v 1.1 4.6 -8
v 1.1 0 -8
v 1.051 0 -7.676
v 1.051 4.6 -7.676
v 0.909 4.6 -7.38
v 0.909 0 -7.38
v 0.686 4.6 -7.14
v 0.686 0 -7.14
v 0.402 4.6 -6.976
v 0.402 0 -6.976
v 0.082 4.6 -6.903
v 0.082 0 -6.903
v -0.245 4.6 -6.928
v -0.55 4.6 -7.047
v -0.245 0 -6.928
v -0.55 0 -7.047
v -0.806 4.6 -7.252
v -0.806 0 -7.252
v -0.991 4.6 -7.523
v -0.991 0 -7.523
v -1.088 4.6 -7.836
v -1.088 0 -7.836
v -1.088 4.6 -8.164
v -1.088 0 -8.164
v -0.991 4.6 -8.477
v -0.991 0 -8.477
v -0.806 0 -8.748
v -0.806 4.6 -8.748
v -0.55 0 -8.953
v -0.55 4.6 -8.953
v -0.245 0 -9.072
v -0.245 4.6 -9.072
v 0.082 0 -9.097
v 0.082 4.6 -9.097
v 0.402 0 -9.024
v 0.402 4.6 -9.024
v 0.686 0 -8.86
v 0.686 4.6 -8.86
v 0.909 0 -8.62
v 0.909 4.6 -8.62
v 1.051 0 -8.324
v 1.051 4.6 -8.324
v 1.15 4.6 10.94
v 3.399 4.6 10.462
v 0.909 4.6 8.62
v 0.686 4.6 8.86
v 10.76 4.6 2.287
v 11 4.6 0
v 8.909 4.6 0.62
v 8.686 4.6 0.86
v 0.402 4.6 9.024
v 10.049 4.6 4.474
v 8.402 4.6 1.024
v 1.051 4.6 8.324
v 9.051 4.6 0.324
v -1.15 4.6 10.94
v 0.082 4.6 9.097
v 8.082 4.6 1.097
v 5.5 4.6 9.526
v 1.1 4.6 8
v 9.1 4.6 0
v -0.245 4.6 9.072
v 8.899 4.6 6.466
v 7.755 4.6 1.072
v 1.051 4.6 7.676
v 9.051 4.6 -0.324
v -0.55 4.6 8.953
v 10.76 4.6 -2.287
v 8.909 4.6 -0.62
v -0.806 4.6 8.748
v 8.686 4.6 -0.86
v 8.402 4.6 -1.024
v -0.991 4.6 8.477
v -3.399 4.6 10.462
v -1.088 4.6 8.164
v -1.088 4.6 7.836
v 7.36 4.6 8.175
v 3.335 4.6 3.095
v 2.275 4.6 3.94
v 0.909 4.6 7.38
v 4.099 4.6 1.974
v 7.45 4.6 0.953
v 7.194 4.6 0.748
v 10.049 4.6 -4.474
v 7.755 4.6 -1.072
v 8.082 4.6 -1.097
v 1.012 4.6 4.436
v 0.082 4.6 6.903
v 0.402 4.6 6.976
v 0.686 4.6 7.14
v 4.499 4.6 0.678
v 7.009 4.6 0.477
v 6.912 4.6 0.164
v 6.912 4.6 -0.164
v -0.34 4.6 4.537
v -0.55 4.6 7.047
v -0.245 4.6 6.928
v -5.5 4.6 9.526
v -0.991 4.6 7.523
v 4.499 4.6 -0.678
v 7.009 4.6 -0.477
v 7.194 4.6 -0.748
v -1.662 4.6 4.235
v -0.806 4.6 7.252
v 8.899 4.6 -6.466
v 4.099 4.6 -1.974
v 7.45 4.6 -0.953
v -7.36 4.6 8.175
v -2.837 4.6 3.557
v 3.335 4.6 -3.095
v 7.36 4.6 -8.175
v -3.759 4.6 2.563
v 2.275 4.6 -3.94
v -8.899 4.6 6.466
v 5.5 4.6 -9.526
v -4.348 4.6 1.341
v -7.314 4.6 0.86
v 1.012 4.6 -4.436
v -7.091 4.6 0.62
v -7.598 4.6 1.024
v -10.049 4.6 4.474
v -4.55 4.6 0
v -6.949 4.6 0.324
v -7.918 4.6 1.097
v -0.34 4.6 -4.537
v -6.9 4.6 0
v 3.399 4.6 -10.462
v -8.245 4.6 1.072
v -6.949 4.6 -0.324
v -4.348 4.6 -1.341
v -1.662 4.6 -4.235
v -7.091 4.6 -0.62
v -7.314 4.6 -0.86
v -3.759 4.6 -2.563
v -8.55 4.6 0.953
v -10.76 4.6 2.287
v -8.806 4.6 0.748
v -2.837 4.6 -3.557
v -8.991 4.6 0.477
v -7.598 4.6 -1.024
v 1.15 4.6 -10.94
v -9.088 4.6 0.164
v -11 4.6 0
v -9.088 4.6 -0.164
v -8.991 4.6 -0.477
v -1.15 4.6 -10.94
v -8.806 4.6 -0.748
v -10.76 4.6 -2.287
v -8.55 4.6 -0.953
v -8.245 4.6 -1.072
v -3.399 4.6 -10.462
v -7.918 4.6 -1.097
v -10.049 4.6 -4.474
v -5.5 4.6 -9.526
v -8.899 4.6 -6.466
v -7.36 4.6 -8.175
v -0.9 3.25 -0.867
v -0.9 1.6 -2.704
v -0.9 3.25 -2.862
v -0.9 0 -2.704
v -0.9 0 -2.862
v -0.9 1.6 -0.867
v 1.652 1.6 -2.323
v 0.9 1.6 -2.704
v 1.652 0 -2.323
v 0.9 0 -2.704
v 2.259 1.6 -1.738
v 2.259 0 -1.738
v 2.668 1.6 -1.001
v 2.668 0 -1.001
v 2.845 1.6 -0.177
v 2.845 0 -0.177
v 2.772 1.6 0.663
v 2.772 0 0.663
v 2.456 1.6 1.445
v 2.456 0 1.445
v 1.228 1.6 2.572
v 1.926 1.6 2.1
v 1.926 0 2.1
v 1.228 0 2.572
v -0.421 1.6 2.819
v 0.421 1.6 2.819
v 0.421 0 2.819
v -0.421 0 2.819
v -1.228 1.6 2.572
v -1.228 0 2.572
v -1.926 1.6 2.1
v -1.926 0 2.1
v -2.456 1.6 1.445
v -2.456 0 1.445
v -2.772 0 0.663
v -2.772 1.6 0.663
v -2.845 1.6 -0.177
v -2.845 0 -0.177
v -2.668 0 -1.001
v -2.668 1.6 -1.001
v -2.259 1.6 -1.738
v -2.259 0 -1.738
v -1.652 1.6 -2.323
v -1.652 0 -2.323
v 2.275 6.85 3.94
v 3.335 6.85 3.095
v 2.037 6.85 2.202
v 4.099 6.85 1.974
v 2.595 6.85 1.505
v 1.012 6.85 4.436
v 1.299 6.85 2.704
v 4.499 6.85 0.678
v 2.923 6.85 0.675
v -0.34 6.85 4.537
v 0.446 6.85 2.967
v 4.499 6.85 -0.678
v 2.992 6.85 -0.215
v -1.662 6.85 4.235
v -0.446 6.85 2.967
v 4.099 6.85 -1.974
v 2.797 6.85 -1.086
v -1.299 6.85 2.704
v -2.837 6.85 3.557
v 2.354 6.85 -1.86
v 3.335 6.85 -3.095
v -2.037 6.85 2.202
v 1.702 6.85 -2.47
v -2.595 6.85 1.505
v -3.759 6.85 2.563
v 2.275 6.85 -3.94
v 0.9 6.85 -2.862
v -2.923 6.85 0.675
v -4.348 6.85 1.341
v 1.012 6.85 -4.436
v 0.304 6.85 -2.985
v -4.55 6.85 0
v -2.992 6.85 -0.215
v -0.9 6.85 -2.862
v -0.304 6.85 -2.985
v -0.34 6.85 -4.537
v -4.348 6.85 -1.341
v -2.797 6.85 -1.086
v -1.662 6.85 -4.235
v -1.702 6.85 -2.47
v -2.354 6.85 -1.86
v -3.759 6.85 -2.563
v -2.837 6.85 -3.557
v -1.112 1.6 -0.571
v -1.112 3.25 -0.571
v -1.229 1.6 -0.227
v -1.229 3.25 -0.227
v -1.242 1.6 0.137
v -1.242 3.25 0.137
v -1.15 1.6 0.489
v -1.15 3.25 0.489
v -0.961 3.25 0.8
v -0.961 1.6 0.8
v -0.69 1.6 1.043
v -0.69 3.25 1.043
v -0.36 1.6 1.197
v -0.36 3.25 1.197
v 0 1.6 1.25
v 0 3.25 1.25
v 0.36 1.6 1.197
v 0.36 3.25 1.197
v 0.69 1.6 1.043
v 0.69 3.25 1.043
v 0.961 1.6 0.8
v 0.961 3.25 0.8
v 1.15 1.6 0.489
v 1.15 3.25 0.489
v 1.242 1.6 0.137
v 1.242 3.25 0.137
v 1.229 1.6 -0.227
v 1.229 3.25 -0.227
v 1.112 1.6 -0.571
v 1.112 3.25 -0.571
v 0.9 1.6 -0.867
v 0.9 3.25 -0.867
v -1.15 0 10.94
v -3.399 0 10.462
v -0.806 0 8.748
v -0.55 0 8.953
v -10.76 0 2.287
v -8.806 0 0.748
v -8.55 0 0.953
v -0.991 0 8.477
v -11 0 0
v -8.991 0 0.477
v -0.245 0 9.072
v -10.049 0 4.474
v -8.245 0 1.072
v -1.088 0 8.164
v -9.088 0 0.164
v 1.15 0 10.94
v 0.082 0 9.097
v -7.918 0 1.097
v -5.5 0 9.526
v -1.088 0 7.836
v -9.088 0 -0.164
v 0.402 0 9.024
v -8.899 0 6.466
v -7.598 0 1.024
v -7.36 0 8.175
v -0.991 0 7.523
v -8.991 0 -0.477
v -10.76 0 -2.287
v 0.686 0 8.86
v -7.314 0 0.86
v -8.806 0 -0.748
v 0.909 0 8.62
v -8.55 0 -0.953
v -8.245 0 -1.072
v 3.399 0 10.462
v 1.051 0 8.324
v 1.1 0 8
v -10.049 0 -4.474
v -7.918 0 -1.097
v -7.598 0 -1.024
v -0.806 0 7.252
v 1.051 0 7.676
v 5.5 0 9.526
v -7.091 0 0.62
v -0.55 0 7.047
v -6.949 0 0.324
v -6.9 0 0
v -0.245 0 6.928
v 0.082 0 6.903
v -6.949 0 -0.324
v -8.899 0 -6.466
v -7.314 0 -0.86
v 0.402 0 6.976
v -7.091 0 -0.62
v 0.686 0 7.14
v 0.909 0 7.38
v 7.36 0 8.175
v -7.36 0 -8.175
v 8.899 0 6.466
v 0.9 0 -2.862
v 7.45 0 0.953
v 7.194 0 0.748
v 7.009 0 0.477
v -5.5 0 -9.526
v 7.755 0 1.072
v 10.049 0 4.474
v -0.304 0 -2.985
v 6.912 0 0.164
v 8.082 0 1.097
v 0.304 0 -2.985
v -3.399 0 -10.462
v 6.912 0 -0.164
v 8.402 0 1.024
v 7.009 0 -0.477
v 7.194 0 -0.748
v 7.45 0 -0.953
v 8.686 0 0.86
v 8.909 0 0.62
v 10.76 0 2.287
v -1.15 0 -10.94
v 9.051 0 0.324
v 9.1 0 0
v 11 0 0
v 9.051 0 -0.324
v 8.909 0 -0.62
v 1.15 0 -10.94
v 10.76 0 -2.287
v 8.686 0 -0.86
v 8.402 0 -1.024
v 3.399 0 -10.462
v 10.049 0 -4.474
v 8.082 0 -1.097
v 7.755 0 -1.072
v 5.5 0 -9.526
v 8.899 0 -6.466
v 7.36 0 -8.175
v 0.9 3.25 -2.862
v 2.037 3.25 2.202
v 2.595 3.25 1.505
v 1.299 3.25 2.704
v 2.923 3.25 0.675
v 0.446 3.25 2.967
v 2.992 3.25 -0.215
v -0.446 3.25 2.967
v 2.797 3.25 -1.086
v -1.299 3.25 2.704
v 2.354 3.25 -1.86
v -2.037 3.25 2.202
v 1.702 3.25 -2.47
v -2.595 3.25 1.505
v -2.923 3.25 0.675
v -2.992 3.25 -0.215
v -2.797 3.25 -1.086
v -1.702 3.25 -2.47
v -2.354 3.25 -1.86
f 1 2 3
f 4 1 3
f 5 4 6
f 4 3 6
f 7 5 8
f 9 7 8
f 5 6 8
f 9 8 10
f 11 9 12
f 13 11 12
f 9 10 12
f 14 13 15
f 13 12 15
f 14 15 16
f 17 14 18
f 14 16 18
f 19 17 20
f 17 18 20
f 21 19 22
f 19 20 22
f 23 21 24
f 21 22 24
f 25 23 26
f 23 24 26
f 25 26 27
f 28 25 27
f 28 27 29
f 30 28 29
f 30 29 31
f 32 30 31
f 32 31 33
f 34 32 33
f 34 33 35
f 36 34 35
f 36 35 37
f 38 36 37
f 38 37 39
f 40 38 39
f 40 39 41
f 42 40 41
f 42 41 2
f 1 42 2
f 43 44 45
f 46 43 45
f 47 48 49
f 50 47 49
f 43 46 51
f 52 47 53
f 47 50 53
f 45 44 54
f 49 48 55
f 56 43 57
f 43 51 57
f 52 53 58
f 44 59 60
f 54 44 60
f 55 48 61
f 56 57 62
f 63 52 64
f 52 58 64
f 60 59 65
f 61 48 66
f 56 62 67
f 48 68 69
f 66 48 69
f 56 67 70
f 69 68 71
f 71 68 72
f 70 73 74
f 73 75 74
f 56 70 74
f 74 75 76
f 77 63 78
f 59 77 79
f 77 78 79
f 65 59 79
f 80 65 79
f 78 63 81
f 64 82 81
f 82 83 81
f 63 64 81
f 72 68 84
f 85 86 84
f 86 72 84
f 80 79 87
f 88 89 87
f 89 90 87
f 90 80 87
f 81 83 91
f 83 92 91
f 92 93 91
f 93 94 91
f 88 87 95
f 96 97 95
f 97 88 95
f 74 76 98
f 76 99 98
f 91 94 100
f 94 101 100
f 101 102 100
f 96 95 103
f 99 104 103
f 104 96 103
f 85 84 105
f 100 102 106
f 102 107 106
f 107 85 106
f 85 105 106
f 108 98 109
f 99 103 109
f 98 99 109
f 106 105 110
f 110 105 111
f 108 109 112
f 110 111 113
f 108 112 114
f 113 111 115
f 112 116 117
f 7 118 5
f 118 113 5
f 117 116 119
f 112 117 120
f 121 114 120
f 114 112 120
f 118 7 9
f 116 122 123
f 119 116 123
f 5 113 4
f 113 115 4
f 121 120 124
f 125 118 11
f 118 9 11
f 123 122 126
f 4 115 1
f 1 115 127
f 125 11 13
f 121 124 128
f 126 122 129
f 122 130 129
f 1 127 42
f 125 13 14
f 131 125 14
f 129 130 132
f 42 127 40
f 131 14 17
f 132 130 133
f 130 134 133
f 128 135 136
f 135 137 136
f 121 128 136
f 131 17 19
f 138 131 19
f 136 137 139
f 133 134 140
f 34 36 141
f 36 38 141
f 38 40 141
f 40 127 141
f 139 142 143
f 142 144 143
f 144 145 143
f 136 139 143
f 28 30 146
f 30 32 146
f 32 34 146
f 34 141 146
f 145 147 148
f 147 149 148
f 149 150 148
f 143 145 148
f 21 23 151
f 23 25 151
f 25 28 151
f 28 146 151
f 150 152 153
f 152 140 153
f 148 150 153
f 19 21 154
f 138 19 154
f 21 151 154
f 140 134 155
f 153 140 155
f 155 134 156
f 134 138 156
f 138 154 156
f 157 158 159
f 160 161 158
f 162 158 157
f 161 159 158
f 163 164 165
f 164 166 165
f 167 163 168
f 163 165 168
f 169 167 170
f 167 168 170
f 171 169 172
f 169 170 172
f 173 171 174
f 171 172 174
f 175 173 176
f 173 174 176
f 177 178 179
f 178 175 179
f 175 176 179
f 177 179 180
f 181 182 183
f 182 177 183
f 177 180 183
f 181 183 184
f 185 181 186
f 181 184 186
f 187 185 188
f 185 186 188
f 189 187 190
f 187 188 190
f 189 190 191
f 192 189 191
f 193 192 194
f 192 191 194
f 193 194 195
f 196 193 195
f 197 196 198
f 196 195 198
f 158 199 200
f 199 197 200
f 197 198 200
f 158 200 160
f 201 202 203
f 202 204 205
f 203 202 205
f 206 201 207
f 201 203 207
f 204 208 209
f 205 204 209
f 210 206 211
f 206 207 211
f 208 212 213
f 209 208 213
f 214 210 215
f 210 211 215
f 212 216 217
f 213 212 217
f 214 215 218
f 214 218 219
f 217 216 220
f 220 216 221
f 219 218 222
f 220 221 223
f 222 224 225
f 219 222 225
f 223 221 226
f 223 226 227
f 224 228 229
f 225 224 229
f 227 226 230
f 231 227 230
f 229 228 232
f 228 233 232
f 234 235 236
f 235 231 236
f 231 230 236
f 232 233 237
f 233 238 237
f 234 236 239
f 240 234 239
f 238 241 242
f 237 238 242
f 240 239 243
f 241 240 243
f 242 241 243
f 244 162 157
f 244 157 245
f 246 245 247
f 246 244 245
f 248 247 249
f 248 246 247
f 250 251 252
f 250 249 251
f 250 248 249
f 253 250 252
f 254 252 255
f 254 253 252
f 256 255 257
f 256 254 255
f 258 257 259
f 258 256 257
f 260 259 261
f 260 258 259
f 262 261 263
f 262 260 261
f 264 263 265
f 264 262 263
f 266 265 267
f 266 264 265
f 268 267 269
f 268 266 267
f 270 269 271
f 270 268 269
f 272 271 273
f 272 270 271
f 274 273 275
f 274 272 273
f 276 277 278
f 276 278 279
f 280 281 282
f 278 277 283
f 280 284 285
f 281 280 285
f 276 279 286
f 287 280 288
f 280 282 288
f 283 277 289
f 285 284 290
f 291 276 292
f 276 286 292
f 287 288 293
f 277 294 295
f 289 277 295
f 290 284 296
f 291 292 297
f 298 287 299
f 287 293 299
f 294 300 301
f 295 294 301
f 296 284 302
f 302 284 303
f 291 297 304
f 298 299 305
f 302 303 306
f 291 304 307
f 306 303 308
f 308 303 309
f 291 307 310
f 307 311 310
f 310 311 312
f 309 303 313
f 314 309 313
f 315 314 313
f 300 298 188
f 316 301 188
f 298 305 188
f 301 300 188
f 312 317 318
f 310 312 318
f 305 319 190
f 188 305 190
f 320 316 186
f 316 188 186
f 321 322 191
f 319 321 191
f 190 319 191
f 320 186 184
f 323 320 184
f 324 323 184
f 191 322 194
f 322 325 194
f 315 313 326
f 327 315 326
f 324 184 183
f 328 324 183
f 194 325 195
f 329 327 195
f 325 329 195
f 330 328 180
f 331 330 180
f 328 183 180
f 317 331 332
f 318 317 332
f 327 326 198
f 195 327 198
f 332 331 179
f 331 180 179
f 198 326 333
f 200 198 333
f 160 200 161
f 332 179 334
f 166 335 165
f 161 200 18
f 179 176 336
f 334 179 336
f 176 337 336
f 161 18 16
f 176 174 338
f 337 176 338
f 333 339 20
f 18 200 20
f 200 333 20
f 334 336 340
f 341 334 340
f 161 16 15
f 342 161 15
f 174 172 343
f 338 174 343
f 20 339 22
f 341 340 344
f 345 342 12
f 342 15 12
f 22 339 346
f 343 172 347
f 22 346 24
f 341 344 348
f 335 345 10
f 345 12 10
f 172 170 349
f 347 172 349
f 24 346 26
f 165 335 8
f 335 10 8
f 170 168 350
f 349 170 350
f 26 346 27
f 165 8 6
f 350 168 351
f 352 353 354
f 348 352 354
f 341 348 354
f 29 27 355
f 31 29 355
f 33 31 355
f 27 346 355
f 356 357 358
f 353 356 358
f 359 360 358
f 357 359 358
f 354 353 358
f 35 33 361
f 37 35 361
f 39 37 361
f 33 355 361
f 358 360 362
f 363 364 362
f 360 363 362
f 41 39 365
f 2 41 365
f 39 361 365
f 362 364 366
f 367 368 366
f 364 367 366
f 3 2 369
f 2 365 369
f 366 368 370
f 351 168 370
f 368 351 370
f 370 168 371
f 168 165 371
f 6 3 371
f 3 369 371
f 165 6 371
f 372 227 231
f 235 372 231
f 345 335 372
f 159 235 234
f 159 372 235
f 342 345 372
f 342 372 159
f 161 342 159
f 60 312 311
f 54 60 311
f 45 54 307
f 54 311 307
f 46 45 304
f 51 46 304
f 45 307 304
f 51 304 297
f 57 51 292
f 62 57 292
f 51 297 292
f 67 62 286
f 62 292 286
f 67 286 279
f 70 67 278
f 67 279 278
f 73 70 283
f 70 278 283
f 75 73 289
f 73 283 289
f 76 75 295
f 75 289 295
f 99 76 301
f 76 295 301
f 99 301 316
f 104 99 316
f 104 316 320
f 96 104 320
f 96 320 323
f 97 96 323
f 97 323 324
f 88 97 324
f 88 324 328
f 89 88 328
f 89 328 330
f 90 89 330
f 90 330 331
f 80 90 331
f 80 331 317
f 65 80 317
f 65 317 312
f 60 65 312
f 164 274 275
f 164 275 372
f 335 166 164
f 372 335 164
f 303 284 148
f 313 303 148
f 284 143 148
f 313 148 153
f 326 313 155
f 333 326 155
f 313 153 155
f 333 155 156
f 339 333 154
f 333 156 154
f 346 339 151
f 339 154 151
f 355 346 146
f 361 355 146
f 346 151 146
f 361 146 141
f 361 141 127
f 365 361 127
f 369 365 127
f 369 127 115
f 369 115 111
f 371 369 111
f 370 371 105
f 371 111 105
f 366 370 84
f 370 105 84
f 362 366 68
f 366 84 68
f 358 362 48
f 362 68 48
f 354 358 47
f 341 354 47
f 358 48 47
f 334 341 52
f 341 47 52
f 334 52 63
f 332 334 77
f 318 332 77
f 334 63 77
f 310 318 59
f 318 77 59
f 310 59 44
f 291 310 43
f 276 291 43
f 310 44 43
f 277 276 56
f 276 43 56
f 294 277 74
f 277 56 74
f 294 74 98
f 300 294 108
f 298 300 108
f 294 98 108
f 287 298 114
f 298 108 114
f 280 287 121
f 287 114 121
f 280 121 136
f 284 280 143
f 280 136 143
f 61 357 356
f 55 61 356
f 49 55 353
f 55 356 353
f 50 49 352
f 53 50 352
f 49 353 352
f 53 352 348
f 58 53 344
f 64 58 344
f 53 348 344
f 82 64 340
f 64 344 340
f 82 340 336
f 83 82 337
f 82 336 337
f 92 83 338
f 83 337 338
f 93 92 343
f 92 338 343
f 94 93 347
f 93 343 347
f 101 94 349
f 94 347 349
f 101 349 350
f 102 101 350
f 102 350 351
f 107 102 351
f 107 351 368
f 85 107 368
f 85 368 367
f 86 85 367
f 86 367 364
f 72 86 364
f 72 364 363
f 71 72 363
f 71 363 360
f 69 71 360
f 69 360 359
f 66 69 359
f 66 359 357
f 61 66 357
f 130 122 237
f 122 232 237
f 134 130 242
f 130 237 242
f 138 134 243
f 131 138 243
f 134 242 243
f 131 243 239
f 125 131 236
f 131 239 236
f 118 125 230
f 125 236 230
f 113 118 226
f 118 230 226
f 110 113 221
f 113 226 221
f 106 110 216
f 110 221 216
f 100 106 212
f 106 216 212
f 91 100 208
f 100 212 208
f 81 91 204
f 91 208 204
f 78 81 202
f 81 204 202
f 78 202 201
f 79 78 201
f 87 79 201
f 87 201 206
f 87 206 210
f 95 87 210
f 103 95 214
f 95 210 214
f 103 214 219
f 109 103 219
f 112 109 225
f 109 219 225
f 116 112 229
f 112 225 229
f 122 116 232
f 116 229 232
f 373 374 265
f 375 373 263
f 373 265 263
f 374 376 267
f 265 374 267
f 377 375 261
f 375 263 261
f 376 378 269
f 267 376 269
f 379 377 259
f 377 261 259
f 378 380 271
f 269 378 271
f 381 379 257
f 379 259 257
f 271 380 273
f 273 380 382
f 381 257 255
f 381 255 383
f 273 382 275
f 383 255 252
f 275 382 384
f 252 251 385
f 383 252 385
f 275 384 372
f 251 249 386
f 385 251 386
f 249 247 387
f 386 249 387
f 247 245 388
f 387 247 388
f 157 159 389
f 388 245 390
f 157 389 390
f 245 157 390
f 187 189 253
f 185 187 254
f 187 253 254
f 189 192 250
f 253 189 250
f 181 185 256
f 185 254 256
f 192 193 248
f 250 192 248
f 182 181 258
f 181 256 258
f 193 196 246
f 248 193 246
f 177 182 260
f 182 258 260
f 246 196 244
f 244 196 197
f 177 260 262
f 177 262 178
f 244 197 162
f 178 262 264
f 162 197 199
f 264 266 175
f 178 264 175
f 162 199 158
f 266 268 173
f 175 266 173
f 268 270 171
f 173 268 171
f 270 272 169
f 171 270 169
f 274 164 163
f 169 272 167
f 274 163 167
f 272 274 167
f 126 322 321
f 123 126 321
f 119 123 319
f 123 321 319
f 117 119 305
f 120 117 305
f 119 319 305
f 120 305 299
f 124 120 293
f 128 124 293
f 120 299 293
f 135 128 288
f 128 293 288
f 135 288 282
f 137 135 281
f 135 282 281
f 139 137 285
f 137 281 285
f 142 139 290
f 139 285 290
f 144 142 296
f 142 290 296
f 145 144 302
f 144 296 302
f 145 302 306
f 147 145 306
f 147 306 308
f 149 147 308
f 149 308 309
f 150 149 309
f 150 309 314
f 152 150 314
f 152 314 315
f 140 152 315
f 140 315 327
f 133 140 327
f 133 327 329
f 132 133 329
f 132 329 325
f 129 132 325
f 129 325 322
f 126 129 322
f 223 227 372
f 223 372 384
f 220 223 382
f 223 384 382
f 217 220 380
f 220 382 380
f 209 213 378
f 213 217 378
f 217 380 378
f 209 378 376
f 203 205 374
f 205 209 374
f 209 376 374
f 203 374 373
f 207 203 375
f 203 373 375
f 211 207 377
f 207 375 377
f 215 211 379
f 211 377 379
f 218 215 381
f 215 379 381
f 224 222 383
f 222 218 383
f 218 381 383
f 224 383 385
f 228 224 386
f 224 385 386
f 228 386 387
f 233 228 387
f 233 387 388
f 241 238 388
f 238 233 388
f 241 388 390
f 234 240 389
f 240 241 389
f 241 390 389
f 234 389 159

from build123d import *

# Parameters (mm, degrees)
CUT_EXTRUDE1_DEPTH      = 16.967466925
CUT_EXTRUDE1_DEPTH_BACK = 16.967466925
SKETCH5_R               = 1.1
CUT_EXTRUDE2_DEPTH      = 10


with BuildPart() as part:
    # Sketch3 → Revolve1 (revolve)
    with BuildSketch(Plane.XY, mode=Mode.PRIVATE) as revolve1_sk:
        Polygon((2.85, 0), (11, 0), (11, 4.6), (4.55, 4.6), (4.55, 6.85), (3, 6.85), (3, 3.25), (0, 3.25), (0, 1.6), (2.85, 1.6), align=None)
    revolve(revolve1_sk.sketch.rotate(Axis((0, 3.25, 0), (0, -1, 0)), 180), axis=Axis((0, 3.25, 0), (0, -1, 0)))

    # Sketch4 → Cut-Extrude1 (cut, two sides: drawn at the far end of the back side and taken through both)
    with BuildSketch(Plane(origin=(0, 3.25, 0), x_dir=(1, 0, 0), z_dir=(0, 1, 0)).offset(-CUT_EXTRUDE1_DEPTH_BACK)):
        with BuildLine():
            Line((-0.9, 2.861817604), (-0.9, 0.867467579))
            ThreePointArc((-0.9, 0.867467579), (0, -1.25), (0.9, 0.867467579))
            Line((0.9, 0.867467579), (0.9, 2.861817604))
            ThreePointArc((0.9, 2.861817604), (0, 3), (-0.9, 2.861817604))
        make_face()
    extrude(amount=CUT_EXTRUDE1_DEPTH + CUT_EXTRUDE1_DEPTH_BACK, mode=Mode.SUBTRACT)

    # Sketch5 → Cut-Extrude2 (cut)
    with BuildSketch(Plane.XZ):
        with Locations((0, 8)):
            Circle(SKETCH5_R)
        with Locations((8, 0)):
            Circle(SKETCH5_R)
        with Locations((0, -8)):
            Circle(SKETCH5_R)
        with Locations((-8, 0)):
            Circle(SKETCH5_R)
    extrude(amount=-CUT_EXTRUDE2_DEPTH, mode=Mode.SUBTRACT)


solid = part.part
